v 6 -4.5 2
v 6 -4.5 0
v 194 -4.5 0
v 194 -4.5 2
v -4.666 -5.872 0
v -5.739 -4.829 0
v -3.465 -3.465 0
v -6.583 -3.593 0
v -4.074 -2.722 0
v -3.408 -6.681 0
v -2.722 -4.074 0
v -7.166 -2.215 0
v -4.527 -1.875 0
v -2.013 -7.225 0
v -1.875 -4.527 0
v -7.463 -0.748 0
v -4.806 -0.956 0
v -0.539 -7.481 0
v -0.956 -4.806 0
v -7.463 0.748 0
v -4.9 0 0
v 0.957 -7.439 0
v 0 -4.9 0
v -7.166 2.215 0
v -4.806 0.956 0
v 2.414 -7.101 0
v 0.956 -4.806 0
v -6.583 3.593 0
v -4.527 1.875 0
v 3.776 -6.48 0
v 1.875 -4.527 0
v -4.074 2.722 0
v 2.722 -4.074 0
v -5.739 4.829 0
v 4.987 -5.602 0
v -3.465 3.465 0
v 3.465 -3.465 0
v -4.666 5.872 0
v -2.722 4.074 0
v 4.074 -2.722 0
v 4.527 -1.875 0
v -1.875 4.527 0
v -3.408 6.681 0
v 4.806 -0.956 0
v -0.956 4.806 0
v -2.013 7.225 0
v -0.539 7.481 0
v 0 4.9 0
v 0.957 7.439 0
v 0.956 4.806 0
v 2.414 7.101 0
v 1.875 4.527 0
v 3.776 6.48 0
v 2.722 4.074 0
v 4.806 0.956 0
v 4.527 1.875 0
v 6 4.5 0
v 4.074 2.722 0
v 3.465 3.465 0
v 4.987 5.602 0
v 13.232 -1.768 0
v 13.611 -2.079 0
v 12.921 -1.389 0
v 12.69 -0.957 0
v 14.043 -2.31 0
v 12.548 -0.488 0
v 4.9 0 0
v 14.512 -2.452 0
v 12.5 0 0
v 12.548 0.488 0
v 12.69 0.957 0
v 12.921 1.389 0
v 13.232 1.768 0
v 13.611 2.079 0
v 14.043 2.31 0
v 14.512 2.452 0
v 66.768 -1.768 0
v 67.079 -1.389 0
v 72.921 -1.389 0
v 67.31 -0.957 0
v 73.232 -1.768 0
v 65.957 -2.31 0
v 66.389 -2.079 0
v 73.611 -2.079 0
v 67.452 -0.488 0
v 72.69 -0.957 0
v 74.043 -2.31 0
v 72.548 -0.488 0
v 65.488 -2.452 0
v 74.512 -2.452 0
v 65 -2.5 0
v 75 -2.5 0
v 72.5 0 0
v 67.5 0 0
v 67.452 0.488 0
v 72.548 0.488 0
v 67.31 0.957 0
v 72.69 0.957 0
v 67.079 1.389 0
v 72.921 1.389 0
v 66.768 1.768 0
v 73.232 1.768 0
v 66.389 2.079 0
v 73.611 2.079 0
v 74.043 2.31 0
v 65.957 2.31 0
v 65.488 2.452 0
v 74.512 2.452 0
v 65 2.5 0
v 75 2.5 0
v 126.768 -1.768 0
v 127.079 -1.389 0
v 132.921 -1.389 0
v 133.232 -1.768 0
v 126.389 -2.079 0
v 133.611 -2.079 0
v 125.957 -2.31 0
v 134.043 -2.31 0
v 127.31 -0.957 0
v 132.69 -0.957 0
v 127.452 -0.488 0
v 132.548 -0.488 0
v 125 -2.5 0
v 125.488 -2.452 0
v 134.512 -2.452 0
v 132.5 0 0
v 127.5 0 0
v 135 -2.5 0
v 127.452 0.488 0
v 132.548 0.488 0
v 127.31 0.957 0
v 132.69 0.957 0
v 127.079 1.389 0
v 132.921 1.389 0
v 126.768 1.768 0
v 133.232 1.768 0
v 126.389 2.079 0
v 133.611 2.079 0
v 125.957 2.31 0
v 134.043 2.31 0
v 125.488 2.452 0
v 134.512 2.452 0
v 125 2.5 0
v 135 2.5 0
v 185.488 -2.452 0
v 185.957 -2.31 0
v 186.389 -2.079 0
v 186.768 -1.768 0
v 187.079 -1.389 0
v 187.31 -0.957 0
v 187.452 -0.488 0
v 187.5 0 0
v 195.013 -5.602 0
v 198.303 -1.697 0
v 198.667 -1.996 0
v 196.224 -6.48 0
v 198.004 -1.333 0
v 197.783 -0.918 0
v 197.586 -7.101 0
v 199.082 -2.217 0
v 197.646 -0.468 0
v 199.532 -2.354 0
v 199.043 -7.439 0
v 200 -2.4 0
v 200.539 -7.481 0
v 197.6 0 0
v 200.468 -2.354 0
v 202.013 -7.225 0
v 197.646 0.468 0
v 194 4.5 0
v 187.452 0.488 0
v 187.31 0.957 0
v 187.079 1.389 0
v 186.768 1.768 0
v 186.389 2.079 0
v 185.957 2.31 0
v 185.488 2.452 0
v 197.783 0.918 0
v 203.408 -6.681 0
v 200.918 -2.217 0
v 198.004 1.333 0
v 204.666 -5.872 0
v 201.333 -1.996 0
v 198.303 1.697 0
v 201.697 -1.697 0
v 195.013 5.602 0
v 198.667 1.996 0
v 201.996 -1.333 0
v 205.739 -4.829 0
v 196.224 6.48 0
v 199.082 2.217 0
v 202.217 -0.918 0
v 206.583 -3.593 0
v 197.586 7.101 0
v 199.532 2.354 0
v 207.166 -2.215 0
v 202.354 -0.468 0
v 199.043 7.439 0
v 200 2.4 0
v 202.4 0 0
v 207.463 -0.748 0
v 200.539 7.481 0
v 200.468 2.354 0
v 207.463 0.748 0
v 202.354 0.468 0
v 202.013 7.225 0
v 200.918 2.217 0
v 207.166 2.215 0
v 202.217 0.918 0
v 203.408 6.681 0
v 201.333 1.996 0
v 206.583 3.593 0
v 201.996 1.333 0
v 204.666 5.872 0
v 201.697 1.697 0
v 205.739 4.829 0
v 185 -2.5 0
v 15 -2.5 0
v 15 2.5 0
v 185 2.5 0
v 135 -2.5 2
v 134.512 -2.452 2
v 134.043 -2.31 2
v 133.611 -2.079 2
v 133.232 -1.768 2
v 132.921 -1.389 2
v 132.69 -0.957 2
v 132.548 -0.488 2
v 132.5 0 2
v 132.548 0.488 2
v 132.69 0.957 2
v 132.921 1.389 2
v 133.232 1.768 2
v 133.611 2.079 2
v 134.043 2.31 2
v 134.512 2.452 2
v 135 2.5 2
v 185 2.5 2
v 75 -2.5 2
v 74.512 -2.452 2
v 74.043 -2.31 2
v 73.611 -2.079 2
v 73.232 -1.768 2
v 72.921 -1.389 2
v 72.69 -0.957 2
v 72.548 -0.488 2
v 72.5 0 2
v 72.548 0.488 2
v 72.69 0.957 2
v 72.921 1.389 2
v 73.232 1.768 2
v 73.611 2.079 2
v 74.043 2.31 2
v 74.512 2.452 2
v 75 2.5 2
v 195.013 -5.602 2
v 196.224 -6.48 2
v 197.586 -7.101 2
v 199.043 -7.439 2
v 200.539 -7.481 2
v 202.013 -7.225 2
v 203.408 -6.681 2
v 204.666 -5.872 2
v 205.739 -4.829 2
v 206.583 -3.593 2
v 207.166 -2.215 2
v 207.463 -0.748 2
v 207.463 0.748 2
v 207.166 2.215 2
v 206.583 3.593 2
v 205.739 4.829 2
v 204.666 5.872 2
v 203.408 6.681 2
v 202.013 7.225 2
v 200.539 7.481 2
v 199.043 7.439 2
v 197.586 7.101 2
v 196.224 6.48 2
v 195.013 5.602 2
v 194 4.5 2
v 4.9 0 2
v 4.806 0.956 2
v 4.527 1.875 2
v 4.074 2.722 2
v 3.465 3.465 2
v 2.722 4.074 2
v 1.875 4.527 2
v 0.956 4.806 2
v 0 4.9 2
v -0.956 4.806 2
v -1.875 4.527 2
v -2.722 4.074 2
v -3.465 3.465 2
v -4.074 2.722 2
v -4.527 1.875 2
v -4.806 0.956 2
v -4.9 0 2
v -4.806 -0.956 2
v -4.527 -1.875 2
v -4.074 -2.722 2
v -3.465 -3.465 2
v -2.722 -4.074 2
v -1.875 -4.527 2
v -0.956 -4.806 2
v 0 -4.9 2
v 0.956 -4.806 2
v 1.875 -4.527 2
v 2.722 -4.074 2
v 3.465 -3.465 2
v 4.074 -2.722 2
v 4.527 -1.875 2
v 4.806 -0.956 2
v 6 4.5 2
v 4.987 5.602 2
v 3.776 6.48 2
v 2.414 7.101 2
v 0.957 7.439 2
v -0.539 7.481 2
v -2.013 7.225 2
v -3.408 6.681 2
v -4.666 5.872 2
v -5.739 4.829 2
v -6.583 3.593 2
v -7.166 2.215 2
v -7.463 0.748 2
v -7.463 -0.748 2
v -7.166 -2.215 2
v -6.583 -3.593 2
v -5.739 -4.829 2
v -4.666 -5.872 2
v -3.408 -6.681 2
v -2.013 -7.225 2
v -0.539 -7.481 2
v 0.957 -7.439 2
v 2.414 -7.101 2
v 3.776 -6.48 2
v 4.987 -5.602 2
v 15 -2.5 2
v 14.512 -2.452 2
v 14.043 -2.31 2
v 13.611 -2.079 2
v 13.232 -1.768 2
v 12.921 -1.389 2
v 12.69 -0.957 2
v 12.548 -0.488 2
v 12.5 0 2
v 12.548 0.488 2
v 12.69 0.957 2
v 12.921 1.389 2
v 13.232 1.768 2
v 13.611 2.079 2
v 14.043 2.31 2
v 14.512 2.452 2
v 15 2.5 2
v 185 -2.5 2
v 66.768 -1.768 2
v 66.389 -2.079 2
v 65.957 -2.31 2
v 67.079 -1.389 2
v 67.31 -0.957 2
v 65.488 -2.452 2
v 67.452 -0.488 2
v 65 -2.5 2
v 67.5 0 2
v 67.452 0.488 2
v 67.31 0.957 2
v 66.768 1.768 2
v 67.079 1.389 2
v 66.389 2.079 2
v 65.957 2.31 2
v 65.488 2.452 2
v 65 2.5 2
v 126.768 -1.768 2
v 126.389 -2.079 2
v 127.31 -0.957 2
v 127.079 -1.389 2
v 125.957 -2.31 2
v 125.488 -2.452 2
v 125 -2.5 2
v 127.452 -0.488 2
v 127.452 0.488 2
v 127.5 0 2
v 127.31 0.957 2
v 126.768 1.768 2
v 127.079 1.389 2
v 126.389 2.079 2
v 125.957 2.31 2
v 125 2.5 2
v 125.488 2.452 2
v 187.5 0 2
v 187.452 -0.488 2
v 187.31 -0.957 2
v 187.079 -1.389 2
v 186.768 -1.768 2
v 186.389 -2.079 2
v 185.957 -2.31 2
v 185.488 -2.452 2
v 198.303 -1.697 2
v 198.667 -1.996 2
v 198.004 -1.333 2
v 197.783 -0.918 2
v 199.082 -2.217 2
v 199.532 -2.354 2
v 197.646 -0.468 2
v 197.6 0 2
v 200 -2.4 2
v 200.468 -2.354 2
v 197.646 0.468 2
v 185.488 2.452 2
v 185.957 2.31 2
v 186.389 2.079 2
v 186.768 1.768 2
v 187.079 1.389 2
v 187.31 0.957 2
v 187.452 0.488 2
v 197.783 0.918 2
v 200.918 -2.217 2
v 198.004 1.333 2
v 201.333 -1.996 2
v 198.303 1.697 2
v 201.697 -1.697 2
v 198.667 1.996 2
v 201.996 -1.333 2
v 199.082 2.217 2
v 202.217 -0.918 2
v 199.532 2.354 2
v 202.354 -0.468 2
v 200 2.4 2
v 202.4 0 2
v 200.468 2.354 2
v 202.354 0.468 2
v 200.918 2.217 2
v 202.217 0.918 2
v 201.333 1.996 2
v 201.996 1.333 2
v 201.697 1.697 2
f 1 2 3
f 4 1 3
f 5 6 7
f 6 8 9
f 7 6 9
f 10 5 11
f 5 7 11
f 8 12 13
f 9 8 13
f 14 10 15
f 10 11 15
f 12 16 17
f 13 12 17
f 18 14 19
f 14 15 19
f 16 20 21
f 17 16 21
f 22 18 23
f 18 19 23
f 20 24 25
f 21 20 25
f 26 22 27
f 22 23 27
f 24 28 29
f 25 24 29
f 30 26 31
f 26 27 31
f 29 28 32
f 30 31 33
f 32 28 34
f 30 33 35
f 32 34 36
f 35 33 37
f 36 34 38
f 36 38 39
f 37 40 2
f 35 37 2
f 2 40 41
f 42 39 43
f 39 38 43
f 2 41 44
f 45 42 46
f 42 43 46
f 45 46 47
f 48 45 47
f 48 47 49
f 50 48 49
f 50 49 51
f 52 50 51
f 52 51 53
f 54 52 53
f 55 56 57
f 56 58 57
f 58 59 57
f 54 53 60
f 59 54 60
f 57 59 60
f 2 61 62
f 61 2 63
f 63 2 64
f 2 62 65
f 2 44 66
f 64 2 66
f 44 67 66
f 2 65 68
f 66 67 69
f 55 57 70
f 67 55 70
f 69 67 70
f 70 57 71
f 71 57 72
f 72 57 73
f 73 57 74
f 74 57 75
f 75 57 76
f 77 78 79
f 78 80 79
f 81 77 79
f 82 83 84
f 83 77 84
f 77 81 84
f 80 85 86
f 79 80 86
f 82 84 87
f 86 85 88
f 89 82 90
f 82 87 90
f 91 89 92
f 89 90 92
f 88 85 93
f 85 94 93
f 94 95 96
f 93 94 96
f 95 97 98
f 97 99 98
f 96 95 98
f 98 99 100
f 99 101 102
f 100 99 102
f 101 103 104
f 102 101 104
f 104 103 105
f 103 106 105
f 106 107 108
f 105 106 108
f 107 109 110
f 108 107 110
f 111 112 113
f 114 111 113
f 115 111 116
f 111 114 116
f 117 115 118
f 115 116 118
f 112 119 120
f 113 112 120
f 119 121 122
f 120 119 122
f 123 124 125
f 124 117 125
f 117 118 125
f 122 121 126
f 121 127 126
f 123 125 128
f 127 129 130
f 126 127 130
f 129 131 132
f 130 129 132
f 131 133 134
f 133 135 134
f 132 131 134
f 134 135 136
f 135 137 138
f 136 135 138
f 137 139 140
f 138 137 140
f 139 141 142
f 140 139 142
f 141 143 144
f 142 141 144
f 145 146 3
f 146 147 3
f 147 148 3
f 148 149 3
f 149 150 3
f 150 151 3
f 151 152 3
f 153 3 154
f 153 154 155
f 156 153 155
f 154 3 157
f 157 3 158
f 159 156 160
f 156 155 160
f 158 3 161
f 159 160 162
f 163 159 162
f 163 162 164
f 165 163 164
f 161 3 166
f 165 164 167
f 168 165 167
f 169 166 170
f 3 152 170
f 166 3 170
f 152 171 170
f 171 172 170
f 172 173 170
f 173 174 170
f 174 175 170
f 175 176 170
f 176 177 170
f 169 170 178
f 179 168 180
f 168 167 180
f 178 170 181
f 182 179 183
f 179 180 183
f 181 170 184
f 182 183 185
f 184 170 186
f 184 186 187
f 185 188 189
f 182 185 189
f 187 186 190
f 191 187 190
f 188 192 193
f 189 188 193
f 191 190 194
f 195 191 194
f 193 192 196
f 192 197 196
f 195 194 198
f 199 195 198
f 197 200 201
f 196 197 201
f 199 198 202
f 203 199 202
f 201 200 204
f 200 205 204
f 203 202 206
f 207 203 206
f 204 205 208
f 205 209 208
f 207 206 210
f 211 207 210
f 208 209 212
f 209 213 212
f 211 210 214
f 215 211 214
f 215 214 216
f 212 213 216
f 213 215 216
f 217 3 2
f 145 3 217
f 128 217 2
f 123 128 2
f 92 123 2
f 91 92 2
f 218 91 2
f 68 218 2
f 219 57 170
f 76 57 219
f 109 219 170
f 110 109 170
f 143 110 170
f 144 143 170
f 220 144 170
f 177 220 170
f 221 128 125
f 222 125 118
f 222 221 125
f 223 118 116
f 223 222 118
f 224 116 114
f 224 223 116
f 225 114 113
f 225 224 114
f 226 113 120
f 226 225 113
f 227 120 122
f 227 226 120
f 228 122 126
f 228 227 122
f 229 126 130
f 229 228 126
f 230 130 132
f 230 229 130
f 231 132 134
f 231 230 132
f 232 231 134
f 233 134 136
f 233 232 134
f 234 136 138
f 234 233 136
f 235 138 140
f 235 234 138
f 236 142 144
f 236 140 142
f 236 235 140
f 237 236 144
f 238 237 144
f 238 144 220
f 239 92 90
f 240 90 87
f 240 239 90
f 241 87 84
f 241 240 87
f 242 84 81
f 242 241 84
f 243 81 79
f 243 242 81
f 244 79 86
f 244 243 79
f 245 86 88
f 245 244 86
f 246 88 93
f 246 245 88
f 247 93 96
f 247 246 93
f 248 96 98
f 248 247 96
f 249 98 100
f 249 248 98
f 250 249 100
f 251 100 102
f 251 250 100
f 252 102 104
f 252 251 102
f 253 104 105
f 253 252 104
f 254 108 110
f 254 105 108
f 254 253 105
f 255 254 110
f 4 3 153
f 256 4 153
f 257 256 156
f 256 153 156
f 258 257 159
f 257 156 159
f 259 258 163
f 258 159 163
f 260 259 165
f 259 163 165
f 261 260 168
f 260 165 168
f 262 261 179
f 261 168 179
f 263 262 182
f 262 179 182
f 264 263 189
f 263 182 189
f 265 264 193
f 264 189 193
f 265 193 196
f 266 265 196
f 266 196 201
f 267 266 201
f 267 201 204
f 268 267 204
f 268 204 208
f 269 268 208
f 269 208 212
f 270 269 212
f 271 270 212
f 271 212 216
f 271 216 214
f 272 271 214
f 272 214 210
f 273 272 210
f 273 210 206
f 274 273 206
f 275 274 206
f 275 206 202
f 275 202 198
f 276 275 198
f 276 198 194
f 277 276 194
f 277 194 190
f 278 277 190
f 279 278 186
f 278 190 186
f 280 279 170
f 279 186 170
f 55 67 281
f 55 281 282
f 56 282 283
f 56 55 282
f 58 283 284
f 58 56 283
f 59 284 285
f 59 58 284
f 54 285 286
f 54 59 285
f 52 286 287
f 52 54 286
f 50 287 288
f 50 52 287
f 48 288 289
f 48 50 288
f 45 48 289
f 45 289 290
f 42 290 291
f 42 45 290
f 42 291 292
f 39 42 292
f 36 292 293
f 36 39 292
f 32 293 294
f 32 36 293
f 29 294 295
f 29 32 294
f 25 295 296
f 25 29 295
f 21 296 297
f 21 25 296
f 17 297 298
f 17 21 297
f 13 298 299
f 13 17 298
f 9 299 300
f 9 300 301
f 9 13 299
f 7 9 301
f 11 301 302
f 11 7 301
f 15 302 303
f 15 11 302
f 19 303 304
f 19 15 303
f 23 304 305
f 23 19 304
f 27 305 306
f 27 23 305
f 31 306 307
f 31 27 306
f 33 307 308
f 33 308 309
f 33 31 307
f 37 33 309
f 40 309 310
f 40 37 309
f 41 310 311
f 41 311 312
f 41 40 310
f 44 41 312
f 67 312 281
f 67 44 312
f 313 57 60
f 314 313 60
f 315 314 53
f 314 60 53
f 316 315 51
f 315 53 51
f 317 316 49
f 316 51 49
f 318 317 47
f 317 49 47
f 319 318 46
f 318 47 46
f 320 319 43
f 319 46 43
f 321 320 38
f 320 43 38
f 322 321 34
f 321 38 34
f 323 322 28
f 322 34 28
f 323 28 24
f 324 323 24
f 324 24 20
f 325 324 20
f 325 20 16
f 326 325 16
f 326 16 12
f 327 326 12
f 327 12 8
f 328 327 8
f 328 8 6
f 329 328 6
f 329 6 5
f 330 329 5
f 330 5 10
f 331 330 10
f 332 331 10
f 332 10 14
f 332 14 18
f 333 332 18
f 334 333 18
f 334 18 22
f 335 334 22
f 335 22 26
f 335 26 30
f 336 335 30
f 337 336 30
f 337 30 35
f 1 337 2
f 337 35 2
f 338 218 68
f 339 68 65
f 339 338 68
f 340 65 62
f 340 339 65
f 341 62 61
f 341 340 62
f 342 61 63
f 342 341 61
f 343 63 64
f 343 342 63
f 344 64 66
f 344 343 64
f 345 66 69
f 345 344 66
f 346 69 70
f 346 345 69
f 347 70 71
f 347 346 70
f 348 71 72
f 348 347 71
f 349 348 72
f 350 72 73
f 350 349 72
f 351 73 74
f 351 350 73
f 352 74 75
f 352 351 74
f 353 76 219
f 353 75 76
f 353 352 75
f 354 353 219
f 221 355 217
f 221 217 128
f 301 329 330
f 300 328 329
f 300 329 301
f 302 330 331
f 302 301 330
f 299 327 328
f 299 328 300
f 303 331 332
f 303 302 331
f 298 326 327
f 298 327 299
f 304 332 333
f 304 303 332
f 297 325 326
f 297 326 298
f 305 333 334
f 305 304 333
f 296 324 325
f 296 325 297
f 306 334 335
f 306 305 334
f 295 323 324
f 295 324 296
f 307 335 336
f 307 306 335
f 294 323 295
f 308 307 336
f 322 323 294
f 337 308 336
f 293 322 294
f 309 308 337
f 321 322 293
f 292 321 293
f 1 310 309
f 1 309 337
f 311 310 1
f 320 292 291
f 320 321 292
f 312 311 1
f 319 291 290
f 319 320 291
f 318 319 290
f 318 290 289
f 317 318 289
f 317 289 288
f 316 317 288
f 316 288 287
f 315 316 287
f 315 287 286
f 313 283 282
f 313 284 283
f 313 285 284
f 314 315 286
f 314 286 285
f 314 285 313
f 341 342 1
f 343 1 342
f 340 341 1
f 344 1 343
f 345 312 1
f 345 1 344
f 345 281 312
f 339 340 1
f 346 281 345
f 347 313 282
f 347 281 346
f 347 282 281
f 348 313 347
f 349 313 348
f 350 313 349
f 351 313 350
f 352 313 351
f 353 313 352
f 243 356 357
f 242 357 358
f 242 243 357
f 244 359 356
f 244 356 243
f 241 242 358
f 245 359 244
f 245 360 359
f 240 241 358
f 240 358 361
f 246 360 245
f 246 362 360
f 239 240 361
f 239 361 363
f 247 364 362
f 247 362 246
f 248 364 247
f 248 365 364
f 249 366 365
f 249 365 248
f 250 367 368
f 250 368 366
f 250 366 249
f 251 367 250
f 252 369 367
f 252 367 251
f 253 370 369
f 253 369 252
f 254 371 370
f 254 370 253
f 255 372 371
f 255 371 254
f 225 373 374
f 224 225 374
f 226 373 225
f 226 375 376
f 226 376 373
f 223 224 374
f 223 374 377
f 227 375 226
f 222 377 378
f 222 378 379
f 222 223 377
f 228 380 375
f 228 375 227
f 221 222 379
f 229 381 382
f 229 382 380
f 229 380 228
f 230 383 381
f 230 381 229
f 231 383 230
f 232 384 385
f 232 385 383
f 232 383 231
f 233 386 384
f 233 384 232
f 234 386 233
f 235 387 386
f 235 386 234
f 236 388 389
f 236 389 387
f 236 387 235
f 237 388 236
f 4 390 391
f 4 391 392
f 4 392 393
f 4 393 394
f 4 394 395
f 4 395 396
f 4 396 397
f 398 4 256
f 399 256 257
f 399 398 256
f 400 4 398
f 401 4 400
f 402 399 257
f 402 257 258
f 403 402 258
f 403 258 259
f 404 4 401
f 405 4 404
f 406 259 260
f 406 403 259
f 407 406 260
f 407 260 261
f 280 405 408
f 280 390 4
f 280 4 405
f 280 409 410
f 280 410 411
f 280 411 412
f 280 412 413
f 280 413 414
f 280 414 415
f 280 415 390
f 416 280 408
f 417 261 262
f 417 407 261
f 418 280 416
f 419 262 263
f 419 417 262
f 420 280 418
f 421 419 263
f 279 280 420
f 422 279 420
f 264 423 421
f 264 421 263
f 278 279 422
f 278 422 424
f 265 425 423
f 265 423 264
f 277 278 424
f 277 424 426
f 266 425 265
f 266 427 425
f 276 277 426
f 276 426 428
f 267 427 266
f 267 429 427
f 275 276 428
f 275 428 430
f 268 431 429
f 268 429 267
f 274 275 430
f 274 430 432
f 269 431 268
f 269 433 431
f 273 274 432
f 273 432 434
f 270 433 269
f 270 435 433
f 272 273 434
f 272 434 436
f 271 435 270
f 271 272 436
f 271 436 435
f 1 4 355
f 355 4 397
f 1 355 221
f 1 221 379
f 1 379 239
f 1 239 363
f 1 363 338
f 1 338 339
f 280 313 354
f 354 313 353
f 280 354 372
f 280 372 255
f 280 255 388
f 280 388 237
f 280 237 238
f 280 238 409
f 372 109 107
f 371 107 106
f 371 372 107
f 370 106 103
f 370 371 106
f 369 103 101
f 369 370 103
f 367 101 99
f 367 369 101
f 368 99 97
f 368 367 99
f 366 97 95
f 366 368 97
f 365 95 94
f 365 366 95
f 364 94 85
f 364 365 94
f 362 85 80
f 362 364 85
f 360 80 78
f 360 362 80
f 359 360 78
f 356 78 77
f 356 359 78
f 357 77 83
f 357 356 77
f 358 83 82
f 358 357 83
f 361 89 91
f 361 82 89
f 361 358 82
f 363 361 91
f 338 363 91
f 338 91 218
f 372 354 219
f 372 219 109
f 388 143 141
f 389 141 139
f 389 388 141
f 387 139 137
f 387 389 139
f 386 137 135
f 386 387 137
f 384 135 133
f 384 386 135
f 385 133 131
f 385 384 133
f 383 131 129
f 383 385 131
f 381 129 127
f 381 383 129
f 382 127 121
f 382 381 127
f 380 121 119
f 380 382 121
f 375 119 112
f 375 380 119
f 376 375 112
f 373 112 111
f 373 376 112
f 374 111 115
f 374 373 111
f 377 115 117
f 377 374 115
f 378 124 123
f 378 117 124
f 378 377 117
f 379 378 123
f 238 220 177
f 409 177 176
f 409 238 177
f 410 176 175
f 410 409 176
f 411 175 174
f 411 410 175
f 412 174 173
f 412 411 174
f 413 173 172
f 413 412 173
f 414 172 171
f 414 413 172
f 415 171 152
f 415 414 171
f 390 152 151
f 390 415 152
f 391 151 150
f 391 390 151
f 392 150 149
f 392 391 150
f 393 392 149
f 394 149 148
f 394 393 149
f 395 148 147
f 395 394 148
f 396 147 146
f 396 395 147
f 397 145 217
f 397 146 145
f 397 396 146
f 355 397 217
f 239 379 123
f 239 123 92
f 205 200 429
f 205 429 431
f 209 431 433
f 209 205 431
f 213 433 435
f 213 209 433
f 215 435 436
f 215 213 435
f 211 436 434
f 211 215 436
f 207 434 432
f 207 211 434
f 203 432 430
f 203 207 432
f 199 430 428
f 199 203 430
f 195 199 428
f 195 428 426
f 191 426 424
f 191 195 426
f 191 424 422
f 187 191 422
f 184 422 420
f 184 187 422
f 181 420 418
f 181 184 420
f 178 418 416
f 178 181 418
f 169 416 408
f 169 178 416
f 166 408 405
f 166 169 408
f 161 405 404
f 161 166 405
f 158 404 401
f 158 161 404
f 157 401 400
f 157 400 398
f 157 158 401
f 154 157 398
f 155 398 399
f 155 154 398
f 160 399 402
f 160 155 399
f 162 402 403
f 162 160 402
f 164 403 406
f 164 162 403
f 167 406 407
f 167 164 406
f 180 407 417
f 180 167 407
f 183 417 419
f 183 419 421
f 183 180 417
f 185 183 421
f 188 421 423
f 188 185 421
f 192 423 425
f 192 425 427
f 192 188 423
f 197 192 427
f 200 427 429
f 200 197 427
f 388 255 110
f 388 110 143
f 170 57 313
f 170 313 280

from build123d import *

# Parameters (mm, degrees)
SKETCH1_R           = 7.5
SKETCH1_R_2         = 4.9
SKETCH1_R_3         = 2.4
SKETCH1_W           = 188
SKETCH1_H           = 9
BOSS_EXTRUDE1_DEPTH = 2
CUT_EXTRUDE1_DEPTH  = 208.645129969


with BuildPart() as part:
    # Sketch1 → Boss-Extrude1 (new body)
    # profile 1 of 3: a face of its own
    with BuildSketch(Plane.XY):
        Circle(SKETCH1_R)
        Circle(SKETCH1_R_2, mode=Mode.SUBTRACT)
    # profile 2 of 3: a face of its own
    with BuildSketch(Plane.XY):
        with Locations((200, 0)):
            Circle(SKETCH1_R)
        with Locations((200, 0)):
            Circle(SKETCH1_R_3, mode=Mode.SUBTRACT)
    # profile 3 of 3: a face of its own
    with BuildSketch(Plane.XY):
        with Locations((100, 0)):
            Rectangle(SKETCH1_W, SKETCH1_H)
    extrude(amount=BOSS_EXTRUDE1_DEPTH)

    # Sketch2 → Cut-Extrude1 (cut, through all)
    with BuildSketch(Plane.XY.offset(2)):
        with BuildLine():
            Line((75, 2.5), (125, 2.5))
            ThreePointArc((125, 2.5), (127.5, 0), (125, -2.5))
            Line((125, -2.5), (75, -2.5))
            ThreePointArc((75, -2.5), (72.5, 0), (75, 2.5))
        make_face()
        with BuildLine():
            Line((135, 2.5), (185, 2.5))
            ThreePointArc((185, 2.5), (187.5, 0), (185, -2.5))
            Line((185, -2.5), (135, -2.5))
            ThreePointArc((135, -2.5), (132.5, 0), (135, 2.5))
        make_face()
        with BuildLine():
            Line((15, 2.5), (65, 2.5))
            ThreePointArc((65, 2.5), (67.5, 0), (65, -2.5))
            Line((65, -2.5), (15, -2.5))
            ThreePointArc((15, -2.5), (12.5, 0), (15, 2.5))
        make_face()
    extrude(amount=-CUT_EXTRUDE1_DEPTH, mode=Mode.SUBTRACT)


solid = part.part
